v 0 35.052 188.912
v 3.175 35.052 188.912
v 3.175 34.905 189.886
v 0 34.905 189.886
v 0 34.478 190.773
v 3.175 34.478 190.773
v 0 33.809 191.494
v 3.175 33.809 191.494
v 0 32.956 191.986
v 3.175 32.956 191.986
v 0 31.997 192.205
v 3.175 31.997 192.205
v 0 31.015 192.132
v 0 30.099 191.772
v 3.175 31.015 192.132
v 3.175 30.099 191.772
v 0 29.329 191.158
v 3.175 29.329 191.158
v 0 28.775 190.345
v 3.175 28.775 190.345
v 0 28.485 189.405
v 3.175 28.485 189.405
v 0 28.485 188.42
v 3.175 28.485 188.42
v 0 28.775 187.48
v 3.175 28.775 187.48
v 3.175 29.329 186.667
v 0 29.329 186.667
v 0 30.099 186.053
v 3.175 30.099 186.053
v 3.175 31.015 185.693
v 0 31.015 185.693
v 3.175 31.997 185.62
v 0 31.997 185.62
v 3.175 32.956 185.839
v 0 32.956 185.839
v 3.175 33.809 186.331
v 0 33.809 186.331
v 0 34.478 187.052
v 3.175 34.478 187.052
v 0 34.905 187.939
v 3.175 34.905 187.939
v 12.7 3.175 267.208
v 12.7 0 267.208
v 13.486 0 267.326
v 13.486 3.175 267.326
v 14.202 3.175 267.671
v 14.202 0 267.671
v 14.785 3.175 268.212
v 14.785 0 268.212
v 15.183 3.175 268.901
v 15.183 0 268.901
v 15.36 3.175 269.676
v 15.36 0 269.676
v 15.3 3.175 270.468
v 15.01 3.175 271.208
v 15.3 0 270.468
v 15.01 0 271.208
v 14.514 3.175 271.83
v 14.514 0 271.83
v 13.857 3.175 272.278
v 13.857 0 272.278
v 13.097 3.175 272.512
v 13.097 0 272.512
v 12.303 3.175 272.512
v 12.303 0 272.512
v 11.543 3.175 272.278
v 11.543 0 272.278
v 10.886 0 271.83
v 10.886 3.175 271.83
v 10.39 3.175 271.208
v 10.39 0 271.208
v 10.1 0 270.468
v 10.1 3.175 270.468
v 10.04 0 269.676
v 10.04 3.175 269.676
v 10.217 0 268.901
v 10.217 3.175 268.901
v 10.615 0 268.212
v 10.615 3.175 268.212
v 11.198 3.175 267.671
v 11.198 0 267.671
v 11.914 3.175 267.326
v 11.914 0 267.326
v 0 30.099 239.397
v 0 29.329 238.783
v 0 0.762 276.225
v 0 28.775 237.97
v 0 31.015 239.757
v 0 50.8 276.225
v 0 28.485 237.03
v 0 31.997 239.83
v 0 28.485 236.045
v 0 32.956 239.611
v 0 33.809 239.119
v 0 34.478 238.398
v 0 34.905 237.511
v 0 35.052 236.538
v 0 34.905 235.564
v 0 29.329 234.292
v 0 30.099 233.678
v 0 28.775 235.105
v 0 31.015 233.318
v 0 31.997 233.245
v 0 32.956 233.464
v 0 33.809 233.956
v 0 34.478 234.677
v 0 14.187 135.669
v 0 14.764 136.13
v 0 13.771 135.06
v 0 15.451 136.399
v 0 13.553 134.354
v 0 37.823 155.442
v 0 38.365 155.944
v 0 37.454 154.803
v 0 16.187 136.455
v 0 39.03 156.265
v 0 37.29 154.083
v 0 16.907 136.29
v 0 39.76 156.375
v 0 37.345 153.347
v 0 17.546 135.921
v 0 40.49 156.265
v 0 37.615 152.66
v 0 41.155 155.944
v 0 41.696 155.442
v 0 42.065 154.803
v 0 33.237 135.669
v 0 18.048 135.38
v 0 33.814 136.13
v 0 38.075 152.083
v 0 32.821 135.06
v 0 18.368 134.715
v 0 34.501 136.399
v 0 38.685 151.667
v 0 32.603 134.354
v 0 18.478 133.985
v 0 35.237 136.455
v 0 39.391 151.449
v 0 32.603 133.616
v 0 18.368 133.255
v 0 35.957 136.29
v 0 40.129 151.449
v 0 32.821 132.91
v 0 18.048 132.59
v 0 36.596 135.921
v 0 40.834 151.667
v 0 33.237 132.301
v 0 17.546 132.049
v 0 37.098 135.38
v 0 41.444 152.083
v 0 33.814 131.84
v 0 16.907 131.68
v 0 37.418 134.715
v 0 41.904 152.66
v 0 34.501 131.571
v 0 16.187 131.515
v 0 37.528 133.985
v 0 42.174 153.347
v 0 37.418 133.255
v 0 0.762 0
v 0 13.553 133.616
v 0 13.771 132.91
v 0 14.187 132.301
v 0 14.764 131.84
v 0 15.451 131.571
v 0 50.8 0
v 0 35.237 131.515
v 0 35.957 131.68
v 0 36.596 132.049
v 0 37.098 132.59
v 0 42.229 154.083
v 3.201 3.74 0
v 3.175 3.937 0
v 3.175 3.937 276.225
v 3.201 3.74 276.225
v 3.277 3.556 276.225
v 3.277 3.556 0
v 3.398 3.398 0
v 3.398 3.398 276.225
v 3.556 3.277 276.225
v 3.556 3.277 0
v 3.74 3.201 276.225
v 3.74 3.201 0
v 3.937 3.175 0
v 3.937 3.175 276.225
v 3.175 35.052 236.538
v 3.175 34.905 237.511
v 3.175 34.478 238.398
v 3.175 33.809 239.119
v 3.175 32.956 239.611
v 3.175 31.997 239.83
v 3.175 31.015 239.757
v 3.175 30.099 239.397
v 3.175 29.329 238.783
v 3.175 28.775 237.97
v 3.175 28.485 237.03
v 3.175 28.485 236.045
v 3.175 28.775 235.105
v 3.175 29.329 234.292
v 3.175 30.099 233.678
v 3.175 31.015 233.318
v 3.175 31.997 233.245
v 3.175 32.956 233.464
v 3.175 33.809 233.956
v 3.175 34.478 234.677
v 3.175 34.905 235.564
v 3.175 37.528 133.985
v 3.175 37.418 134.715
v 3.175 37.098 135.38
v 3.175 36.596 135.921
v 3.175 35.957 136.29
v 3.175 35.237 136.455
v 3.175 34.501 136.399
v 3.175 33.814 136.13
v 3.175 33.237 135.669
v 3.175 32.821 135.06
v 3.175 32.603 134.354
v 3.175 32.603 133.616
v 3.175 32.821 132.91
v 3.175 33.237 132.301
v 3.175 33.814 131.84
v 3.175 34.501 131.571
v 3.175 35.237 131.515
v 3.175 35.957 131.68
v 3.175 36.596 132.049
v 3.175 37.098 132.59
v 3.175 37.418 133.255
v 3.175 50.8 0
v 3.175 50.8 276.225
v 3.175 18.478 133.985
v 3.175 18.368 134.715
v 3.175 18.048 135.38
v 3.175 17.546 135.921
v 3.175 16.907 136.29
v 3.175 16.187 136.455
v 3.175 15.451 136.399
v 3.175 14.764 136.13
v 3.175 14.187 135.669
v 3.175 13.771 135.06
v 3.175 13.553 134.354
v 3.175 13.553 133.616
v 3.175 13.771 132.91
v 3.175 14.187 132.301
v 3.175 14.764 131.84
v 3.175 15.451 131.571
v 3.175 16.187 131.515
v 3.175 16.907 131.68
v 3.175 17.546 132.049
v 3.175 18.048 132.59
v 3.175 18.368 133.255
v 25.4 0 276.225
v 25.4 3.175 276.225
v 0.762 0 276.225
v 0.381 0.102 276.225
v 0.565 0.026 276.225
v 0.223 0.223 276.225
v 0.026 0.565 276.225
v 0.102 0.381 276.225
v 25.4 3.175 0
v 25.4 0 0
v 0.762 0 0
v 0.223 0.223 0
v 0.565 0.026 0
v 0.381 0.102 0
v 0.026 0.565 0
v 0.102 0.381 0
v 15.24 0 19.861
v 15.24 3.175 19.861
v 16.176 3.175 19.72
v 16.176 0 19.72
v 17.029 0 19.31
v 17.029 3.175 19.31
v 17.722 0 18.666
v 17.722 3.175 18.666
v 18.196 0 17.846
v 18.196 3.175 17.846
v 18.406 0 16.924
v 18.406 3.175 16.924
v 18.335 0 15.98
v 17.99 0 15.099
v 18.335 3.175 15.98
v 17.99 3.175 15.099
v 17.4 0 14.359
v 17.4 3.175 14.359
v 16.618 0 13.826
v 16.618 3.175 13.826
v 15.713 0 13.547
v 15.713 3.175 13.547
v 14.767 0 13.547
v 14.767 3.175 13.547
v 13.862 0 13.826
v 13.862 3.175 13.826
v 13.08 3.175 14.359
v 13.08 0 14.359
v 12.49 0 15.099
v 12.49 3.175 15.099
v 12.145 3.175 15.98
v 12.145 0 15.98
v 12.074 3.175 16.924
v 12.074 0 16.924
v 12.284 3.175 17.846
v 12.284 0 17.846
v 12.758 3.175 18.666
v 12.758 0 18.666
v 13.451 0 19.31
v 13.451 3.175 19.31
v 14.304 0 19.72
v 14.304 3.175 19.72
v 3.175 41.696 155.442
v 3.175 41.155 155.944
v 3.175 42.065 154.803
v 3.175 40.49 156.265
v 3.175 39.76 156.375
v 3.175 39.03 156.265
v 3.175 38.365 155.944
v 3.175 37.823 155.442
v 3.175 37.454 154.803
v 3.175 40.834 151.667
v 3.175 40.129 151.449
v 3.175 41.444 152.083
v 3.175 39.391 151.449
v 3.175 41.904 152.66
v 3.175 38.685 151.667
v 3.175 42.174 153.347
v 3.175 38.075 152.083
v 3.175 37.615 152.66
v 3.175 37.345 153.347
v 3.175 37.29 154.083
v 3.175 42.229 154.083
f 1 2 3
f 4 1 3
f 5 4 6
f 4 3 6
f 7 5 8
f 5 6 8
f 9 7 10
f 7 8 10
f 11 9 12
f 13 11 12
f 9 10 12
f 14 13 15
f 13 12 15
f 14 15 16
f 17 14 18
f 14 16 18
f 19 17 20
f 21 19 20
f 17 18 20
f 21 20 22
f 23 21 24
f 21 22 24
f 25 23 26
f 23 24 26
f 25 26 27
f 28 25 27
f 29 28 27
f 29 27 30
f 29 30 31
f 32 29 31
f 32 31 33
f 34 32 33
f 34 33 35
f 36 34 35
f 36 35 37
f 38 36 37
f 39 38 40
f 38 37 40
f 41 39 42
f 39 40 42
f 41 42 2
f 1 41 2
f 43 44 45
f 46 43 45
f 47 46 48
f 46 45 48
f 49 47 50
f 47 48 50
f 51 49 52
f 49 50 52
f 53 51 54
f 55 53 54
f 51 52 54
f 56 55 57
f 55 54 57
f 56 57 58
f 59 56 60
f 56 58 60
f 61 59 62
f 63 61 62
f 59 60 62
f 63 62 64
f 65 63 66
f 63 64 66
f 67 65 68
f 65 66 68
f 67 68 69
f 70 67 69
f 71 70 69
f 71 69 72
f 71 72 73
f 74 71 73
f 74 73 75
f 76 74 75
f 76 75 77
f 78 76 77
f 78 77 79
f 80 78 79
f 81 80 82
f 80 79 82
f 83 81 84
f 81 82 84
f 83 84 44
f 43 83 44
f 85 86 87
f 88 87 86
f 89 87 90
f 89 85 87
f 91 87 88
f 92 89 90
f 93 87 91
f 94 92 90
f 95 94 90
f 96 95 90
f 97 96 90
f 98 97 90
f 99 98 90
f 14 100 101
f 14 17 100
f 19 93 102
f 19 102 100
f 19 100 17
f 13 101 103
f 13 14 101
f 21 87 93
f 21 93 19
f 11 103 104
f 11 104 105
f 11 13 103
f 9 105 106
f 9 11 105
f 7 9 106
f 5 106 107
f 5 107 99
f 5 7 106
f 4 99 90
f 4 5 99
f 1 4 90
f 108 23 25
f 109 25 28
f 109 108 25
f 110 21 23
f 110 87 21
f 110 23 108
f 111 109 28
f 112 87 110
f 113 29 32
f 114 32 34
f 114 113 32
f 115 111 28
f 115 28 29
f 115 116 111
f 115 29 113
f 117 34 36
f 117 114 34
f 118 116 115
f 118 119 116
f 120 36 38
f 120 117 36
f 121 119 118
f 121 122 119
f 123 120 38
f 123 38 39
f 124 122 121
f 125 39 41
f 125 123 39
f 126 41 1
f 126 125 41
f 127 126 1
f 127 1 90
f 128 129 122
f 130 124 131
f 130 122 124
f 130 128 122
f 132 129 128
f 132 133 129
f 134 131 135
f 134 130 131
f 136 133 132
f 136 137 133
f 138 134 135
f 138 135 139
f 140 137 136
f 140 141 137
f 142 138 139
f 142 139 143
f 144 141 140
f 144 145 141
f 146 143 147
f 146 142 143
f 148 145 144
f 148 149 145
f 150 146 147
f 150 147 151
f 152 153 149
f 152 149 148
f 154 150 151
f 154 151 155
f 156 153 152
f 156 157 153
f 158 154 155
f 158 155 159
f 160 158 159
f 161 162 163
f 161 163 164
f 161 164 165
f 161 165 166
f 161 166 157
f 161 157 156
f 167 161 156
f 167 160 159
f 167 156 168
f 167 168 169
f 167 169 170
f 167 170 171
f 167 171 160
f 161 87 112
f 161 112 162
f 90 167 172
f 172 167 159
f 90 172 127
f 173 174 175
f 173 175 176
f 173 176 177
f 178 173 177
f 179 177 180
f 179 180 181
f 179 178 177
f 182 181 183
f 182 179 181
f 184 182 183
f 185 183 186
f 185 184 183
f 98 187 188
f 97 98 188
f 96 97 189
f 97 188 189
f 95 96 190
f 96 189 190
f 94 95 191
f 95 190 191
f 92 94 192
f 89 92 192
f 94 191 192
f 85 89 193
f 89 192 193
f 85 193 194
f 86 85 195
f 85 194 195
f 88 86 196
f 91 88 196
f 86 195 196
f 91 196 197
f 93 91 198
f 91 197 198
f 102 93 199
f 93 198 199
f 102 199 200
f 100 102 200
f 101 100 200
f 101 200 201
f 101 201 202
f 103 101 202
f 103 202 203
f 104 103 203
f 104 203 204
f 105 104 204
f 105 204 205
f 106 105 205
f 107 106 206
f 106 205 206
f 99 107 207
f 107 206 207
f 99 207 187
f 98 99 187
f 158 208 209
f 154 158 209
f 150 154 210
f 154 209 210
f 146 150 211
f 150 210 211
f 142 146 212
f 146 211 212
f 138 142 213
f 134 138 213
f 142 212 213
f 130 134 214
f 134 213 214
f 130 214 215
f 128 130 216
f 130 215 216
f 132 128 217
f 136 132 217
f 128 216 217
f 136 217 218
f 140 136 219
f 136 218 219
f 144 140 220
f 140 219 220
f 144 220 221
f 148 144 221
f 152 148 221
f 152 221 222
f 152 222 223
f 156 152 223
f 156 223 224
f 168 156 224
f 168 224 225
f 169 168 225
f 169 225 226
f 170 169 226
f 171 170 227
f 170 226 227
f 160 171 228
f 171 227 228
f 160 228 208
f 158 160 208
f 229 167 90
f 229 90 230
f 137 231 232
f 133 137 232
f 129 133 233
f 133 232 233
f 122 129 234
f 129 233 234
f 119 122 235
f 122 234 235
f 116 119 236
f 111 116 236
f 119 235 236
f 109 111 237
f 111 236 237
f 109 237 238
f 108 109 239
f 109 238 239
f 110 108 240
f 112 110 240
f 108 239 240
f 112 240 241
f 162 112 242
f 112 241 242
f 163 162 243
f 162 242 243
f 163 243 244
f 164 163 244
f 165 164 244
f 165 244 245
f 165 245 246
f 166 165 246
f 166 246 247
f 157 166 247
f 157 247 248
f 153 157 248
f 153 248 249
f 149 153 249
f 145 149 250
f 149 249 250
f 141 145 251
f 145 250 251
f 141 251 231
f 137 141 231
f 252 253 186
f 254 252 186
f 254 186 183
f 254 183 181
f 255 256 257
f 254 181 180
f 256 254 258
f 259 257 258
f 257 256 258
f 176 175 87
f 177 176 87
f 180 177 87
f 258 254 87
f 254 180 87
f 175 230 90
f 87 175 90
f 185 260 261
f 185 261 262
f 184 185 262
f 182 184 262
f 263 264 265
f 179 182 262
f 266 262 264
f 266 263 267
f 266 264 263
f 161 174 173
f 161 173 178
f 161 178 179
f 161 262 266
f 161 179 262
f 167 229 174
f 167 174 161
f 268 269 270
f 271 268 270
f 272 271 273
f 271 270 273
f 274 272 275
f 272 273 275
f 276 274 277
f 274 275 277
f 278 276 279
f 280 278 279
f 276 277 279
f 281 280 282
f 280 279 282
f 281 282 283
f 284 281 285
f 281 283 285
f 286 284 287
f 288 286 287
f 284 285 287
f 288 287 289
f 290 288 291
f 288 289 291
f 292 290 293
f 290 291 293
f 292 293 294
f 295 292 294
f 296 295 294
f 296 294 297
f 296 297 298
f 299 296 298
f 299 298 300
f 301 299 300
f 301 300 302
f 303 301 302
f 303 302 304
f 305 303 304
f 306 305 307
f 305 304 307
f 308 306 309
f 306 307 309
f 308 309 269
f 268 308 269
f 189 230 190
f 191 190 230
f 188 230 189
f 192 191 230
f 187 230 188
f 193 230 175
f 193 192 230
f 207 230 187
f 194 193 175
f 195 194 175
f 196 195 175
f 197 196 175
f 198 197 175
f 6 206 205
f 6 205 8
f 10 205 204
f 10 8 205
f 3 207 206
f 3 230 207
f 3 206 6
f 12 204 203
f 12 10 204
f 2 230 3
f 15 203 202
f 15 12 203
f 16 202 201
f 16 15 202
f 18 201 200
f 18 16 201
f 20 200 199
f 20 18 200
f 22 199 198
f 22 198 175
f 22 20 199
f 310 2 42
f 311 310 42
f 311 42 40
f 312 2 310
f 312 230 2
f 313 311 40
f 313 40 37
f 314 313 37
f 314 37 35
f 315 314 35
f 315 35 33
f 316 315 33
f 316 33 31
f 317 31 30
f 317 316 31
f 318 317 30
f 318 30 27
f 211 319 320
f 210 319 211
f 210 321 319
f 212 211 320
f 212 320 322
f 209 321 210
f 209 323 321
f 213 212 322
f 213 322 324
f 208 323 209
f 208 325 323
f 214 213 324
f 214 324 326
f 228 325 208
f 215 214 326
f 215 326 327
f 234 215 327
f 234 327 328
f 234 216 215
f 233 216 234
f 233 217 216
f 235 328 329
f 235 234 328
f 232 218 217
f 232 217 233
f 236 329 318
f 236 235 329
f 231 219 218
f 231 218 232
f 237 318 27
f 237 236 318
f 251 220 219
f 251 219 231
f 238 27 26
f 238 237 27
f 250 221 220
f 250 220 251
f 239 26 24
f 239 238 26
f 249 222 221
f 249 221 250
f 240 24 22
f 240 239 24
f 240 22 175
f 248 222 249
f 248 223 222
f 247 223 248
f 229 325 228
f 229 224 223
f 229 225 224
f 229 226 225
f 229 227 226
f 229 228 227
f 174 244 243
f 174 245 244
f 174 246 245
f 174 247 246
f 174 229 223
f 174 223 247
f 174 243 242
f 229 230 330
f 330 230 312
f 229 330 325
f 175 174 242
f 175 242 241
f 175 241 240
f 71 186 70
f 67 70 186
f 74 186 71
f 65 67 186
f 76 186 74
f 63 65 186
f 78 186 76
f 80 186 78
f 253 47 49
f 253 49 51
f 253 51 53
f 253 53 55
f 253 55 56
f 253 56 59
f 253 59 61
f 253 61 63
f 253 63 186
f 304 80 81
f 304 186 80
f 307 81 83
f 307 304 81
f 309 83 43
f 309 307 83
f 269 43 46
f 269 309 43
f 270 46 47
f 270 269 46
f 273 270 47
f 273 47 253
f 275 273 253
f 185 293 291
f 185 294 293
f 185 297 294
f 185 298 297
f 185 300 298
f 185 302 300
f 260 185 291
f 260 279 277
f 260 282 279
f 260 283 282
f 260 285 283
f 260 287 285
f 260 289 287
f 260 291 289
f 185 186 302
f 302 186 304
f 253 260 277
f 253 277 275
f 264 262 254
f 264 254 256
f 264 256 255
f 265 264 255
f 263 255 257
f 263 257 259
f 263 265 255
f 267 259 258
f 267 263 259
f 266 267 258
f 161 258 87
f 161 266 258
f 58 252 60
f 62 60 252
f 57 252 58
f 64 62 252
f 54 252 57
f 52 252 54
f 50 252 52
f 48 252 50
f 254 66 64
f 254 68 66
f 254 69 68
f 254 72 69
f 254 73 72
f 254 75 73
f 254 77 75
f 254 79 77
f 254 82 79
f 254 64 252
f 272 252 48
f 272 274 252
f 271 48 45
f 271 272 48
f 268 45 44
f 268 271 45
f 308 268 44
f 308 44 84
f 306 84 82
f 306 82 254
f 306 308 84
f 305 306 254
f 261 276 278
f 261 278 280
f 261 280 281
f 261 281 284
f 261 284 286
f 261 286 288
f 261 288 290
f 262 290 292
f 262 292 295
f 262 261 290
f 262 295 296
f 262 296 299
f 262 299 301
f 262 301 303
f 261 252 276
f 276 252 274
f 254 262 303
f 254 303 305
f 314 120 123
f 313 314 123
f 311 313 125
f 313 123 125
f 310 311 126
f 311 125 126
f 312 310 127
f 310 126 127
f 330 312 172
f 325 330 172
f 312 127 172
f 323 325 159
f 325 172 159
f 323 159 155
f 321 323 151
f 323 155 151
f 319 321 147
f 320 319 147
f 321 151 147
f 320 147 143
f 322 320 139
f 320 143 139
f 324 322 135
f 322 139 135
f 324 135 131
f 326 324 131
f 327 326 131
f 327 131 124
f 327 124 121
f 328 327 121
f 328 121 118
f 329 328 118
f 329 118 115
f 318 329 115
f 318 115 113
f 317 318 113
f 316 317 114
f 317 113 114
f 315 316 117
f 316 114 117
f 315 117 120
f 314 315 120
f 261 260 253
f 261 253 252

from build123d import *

# Parameters (mm, degrees)
BOSS_EXTRUDE1_DEPTH = 276.225
SKETCH3_R           = 2.667
CUT_EXTRUDE2_DEPTH  = 3.175
SKETCH4_R           = 3.302
SKETCH4_R_2         = 2.4765
CUT_EXTRUDE3_DEPTH  = 3.175
SKETCH8_R           = 2.4765
CUT_EXTRUDE5_DEPTH  = 3.175
SKETCH9_R           = 3.175
CUT_EXTRUDE6_DEPTH  = 3.175


with BuildPart() as part:
    # Sketch1 → Boss-Extrude1 (new body)
    with BuildSketch(Plane.XY):
        with BuildLine():
            Line((3.175, 50.8), (3.175, 3.937))
            ThreePointArc((3.175, 3.937), (3.398184633, 3.398184633), (3.937, 3.175))
            Line((3.937, 3.175), (25.4, 3.175))
            Line((25.4, 3.175), (25.4, 0))
            Line((25.4, 0), (0.762, 0))
            ThreePointArc((0.762, 0), (0.223184633, 0.223184633), (0, 0.762))
            Line((0, 0.762), (0, 50.8))
            Line((0, 50.8), (3.175, 50.8))
        make_face()
    extrude(amount=BOSS_EXTRUDE1_DEPTH)

    # Sketch3 → Cut-Extrude2 (cut)
    with BuildSketch(Plane.XZ):
        with Locations(Location((12.7, 269.875, 0), (0, 0, 270))):
            Circle(SKETCH3_R)
    extrude(amount=-CUT_EXTRUDE2_DEPTH, mode=Mode.SUBTRACT)

    # Sketch4 → Cut-Extrude3 (cut)
    with BuildSketch(Plane(origin=(3.175, 0, 0), x_dir=(0, 0, -1), z_dir=(1, 0, 0))):
        with Locations(Location((-188.9125, 31.75, 0), (0, 0, 90))):
            Circle(SKETCH4_R)
        with Locations(Location((-236.5375, 31.75, 0), (0, 0, 90))):
            Circle(SKETCH4_R)
        with Locations(Location((-133.985, 16.002, 0), (0, 0, 90))):
            Circle(SKETCH4_R_2)
        with Locations(Location((-133.985, 35.052, 0), (0, 0, 90))):
            Circle(SKETCH4_R_2)
    extrude(amount=-CUT_EXTRUDE3_DEPTH, mode=Mode.SUBTRACT)

    # Sketch8 → Cut-Extrude5 (cut)
    with BuildSketch(Plane.ZY):
        with Locations((153.898092, 39.759636)):
            Circle(SKETCH8_R)
    extrude(amount=-CUT_EXTRUDE5_DEPTH, mode=Mode.SUBTRACT)

    # Sketch9 → Cut-Extrude6 (cut)
    with BuildSketch(Plane(origin=(0, 3.175, 0), x_dir=(1, 0, 0), z_dir=(0, 1, 0))):
        with Locations(Location((15.24, -16.686276, 0), (0, 0, 270))):
            Circle(SKETCH9_R)
    extrude(amount=-CUT_EXTRUDE6_DEPTH, mode=Mode.SUBTRACT)


solid = part.part
